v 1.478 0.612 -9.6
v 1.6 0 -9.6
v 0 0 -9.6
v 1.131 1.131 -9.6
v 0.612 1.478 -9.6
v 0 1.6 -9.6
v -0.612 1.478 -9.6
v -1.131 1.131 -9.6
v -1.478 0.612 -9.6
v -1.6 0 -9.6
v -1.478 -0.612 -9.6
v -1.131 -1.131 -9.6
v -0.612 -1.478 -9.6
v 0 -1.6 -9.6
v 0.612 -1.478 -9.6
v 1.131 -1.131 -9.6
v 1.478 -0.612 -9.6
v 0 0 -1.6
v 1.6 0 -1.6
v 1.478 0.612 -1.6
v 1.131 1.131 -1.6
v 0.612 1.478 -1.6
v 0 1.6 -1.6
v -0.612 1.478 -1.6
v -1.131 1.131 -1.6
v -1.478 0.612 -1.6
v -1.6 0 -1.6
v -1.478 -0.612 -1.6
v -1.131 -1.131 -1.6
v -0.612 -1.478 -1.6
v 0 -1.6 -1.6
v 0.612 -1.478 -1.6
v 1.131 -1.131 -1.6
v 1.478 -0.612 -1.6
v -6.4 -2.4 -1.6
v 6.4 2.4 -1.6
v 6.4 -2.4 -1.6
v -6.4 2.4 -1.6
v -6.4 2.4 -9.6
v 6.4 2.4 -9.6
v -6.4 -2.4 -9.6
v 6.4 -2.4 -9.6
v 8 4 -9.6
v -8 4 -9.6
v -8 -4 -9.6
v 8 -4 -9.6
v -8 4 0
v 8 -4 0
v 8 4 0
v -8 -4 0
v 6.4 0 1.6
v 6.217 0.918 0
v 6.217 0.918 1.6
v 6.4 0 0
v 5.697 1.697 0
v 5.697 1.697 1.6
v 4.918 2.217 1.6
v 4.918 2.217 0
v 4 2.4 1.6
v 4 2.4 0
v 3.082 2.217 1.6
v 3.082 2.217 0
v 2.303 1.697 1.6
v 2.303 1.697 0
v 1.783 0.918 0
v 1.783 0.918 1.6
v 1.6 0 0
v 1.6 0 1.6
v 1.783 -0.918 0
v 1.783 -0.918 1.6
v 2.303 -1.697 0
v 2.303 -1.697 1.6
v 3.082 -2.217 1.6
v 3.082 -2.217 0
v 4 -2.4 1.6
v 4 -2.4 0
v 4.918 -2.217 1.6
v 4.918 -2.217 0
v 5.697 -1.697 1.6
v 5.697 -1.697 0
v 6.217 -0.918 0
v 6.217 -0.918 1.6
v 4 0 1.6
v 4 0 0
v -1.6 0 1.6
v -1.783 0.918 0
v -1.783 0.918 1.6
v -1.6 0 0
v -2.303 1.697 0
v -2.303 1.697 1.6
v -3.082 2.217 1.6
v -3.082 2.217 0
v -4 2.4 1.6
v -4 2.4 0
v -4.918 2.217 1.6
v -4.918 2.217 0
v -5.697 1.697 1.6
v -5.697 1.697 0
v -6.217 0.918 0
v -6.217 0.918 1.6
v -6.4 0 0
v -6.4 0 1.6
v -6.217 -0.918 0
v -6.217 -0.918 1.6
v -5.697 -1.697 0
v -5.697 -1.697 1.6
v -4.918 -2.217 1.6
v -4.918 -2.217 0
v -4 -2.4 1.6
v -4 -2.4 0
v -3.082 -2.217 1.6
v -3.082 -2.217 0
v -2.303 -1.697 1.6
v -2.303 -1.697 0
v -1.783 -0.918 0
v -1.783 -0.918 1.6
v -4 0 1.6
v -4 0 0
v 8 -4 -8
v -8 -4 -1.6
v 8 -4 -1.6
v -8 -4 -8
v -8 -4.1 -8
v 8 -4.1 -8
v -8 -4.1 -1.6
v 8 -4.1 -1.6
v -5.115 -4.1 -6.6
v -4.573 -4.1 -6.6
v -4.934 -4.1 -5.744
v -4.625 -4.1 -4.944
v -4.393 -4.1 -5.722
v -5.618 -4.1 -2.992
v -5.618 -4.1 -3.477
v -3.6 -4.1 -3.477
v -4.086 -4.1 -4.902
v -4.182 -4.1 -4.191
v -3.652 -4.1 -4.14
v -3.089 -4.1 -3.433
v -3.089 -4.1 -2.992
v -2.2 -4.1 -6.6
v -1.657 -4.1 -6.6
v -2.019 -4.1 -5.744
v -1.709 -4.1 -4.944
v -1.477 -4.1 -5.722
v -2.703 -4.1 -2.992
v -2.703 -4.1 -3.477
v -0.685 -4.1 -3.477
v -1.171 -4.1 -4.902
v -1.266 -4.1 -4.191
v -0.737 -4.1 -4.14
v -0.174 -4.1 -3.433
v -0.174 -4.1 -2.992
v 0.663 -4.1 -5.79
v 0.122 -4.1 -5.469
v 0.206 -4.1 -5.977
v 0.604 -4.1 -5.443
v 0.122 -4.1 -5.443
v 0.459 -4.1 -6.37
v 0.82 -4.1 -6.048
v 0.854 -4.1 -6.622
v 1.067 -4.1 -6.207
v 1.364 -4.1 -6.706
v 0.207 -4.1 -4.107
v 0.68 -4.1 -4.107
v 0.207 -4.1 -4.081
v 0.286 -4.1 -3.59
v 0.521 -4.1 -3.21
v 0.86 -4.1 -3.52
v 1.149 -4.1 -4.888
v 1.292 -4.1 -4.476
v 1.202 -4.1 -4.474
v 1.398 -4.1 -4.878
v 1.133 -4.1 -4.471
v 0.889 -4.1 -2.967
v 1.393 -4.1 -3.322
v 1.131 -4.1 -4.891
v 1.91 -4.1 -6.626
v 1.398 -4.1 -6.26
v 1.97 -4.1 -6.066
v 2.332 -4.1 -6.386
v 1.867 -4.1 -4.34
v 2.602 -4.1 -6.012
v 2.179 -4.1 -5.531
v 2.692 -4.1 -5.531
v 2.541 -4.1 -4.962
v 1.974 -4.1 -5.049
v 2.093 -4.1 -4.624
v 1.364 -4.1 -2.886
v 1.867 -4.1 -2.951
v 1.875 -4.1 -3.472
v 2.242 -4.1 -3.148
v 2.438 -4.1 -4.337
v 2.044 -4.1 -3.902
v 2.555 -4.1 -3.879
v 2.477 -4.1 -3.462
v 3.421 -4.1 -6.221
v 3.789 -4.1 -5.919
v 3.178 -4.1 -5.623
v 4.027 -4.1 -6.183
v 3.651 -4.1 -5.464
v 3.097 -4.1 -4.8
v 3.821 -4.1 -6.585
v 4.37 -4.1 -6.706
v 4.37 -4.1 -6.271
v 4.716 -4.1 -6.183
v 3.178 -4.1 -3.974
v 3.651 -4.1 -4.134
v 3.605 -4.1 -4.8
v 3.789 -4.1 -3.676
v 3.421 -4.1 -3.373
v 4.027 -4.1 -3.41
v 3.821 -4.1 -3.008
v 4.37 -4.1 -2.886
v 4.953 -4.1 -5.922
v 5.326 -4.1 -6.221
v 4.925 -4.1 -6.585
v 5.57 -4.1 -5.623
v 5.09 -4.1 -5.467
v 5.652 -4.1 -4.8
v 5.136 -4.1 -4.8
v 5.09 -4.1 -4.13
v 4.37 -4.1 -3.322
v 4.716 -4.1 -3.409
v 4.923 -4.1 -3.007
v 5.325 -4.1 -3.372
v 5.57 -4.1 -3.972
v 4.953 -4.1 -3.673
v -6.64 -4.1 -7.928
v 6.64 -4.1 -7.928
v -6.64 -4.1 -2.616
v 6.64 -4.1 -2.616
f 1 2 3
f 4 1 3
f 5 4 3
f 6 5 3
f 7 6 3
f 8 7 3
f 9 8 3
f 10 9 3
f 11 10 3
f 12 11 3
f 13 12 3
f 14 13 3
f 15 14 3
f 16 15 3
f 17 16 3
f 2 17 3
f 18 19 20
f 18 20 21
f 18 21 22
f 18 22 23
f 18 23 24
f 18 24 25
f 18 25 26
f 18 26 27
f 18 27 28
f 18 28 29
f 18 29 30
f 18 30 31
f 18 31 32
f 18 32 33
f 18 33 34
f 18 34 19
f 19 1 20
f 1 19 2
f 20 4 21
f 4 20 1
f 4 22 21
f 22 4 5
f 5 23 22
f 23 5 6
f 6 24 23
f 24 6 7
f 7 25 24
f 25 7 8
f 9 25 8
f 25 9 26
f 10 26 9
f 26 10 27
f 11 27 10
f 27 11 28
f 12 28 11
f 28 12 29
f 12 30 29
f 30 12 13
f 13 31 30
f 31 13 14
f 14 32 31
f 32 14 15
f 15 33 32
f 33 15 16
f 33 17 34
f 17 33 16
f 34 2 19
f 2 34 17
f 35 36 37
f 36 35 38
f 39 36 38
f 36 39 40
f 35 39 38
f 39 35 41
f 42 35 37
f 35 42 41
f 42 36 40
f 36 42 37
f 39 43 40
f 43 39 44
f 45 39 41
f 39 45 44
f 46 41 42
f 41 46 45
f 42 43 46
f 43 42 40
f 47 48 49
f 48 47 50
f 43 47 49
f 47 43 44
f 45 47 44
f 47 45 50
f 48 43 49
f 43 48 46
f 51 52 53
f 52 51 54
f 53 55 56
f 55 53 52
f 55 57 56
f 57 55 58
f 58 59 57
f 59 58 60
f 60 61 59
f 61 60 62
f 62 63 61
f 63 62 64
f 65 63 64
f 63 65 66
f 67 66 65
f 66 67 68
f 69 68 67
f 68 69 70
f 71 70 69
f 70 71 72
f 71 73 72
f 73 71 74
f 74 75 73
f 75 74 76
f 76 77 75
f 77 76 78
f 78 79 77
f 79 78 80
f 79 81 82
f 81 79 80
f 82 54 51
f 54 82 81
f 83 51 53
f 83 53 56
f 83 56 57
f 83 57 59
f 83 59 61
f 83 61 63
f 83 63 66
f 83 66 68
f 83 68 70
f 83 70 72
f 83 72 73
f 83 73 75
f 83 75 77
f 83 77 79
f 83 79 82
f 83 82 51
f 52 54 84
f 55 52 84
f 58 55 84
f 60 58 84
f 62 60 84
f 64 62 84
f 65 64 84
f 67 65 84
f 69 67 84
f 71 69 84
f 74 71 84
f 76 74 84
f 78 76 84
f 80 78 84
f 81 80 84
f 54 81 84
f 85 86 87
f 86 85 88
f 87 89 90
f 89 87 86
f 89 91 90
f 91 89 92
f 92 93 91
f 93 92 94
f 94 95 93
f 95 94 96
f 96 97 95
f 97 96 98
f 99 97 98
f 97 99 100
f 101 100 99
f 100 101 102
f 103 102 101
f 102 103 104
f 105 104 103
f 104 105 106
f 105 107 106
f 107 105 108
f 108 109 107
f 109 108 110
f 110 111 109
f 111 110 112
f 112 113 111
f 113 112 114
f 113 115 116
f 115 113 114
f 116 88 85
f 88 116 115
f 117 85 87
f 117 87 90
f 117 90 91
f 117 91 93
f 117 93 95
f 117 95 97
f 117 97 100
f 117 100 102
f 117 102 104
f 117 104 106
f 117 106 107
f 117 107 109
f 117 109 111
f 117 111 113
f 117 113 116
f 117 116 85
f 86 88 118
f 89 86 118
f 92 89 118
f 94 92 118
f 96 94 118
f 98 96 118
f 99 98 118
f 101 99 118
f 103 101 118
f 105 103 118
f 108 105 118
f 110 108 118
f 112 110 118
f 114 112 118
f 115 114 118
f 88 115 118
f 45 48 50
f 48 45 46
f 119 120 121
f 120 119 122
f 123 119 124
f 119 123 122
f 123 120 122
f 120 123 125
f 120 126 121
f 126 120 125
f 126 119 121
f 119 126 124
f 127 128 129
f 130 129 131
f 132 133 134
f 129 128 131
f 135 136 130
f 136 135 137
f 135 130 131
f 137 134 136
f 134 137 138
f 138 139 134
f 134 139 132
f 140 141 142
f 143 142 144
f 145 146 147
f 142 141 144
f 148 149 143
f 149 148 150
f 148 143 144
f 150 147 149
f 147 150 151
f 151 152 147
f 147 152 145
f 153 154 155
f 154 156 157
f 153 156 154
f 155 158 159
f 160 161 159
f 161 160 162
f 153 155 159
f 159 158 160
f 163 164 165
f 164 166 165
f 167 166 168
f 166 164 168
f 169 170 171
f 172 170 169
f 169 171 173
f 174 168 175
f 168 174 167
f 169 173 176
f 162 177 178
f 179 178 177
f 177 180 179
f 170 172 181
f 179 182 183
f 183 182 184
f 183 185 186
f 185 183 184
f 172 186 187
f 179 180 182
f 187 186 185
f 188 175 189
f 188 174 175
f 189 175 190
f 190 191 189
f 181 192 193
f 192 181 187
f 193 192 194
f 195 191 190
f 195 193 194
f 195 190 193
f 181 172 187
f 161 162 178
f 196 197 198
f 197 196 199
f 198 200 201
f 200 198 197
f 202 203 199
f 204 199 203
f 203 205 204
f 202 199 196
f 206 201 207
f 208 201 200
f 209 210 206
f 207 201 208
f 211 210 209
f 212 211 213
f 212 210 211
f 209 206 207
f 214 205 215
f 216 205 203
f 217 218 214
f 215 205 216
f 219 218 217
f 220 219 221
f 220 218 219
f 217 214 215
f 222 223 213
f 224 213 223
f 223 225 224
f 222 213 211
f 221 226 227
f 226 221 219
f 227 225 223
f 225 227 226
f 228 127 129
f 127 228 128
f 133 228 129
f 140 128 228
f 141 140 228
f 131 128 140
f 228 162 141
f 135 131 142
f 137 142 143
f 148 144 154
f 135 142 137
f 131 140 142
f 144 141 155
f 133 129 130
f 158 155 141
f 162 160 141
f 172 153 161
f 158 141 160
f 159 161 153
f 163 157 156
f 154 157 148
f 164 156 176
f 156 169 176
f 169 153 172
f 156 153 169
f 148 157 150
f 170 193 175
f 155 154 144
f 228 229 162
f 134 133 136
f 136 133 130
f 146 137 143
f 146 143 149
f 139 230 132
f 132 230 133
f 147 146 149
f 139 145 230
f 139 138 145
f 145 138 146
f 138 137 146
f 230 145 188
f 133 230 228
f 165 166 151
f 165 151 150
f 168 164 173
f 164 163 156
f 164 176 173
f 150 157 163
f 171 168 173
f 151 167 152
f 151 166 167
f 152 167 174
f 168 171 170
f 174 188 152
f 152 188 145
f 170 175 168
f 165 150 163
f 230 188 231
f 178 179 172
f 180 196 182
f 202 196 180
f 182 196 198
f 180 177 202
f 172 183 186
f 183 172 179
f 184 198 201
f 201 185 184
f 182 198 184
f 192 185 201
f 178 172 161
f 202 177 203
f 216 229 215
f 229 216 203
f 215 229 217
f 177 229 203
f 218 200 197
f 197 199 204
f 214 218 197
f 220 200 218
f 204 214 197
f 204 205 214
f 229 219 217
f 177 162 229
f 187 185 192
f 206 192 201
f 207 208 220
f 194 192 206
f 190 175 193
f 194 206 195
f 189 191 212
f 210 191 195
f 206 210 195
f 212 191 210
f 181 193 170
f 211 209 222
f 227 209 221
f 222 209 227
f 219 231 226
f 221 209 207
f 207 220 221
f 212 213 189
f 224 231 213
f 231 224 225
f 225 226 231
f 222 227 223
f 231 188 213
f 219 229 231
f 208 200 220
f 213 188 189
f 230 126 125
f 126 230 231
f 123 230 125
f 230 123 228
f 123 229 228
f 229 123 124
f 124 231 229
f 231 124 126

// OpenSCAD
// file: ../p/4-4edge.scad
use <../lib.scad>
function ldraw_lib__4_4edge() = [
// 0 Circle 1.0
// 0 Name: 4-4edge.dat
// 0 Author: James Jessiman
// 0 !LDRAW_ORG Primitive UPDATE 2017-01
// 0 !LICENSE Licensed under CC BY 2.0 and CC BY 4.0 : see CAreadme.txt
// 
// 0 BFC CERTIFY CCW
  [0,"BFC","CERTIFY"],
  [0,"BFC","CCW"],
// 
// 0 !HISTORY 1998-12-15 [PTadmin] Official Update 1998-10
// 0 !HISTORY 2005-12-28 [PTadmin] Official Update 2005-01
// 0 !HISTORY 2007-06-24 [PTadmin] Header formatted for Contributor Agreement
// 0 !HISTORY 2008-07-01 [PTadmin] Official Update 2008-01
// 0 !HISTORY 2017-01-15 [Steffen] BFCed
// 0 !HISTORY 2017-12-30 [PTadmin] Official Update 2017-01
// 
// 
// 2 24 1 0 0 0.9239 0 0.3827
  [2,24,1,0,0,0.9239,0,0.3827],
// 2 24 0.9239 0 0.3827 0.7071 0 0.7071
  [2,24,0.9239,0,0.3827,0.7071,0,0.7071],
// 2 24 0.7071 0 0.7071 0.3827 0 0.9239
  [2,24,0.7071,0,0.7071,0.3827,0,0.9239],
// 2 24 0.3827 0 0.9239 0 0 1
  [2,24,0.3827,0,0.9239,0,0,1],
// 2 24 0 0 1 -0.3827 0 0.9239
  [2,24,0,0,1,-0.3827,0,0.9239],
// 2 24 -0.3827 0 0.9239 -0.7071 0 0.7071
  [2,24,-0.3827,0,0.9239,-0.7071,0,0.7071],
// 2 24 -0.7071 0 0.7071 -0.9239 0 0.3827
  [2,24,-0.7071,0,0.7071,-0.9239,0,0.3827],
// 2 24 -0.9239 0 0.3827 -1 0 -0
  [2,24,-0.9239,0,0.3827,-1,0,-0],
// 2 24 -1 0 -0 -0.9239 0 -0.3827
  [2,24,-1,0,-0,-0.9239,0,-0.3827],
// 2 24 -0.9239 0 -0.3827 -0.7071 0 -0.7071
  [2,24,-0.9239,0,-0.3827,-0.7071,0,-0.7071],
// 2 24 -0.7071 0 -0.7071 -0.3827 0 -0.9239
  [2,24,-0.7071,0,-0.7071,-0.3827,0,-0.9239],
// 2 24 -0.3827 0 -0.9239 0 0 -1
  [2,24,-0.3827,0,-0.9239,0,0,-1],
// 2 24 0 0 -1 0.3827 0 -0.9239
  [2,24,0,0,-1,0.3827,0,-0.9239],
// 2 24 0.3827 0 -0.9239 0.7071 0 -0.7071
  [2,24,0.3827,0,-0.9239,0.7071,0,-0.7071],
// 2 24 0.7071 0 -0.7071 0.9239 0 -0.3827
  [2,24,0.7071,0,-0.7071,0.9239,0,-0.3827],
// 2 24 0.9239 0 -0.3827 1 0 0
  [2,24,0.9239,0,-0.3827,1,0,0],
];
module ldraw_lib__4_4edge(step=0, col=false, unit=2/5, alt=false, line=0.2, solid=!$preview)
    makepoly(ldraw_lib__4_4edge(), step=step, col=col, unit=unit, alt=alt, line=line, solid=solid);
ldraw_lib__4_4edge(line=0.2);
// file: ../p/4-4disc.scad
use <../lib.scad>
function ldraw_lib__4_4disc() = [
// 0 Disc 1.0
// 0 Name: 4-4disc.dat
// 0 Author: James Jessiman
// 0 !LDRAW_ORG Primitive UPDATE 2002-02
// 0 !LICENSE Licensed under CC BY 2.0 and CC BY 4.0 : see CAreadme.txt
// 
// 0 BFC CERTIFY CCW
  [0,"BFC","CERTIFY"],
  [0,"BFC","CCW"],
// 
// 0 !HISTORY 1998-12-15 [PTadmin] Official Update 1998-10
// 0 !HISTORY 2002-03-23 [sbliss] Added BFC statement
// 0 !HISTORY 2002-04-25 [PTadmin] Official Update 2002-02
// 0 !HISTORY 2007-06-24 [PTadmin] Header formatted for Contributor Agreement
// 0 !HISTORY 2008-07-01 [PTadmin] Official Update 2008-01
// 
// 
// 3 16 0 0 0 1 0 0 0.9239 0 0.3827
  [3,16,0,0,0,1,0,0,0.9239,0,0.3827],
// 3 16 0 0 0 0.9239 0 0.3827 0.7071 0 0.7071
  [3,16,0,0,0,0.9239,0,0.3827,0.7071,0,0.7071],
// 3 16 0 0 0 0.7071 0 0.7071 0.3827 0 0.9239
  [3,16,0,0,0,0.7071,0,0.7071,0.3827,0,0.9239],
// 3 16 0 0 0 0.3827 0 0.9239 0 0 1
  [3,16,0,0,0,0.3827,0,0.9239,0,0,1],
// 3 16 0 0 0 0 0 1 -0.3827 0 0.9239
  [3,16,0,0,0,0,0,1,-0.3827,0,0.9239],
// 3 16 0 0 0 -0.3827 0 0.9239 -0.7071 0 0.7071
  [3,16,0,0,0,-0.3827,0,0.9239,-0.7071,0,0.7071],
// 3 16 0 0 0 -0.7071 0 0.7071 -0.9239 0 0.3827
  [3,16,0,0,0,-0.7071,0,0.7071,-0.9239,0,0.3827],
// 3 16 0 0 0 -0.9239 0 0.3827 -1 0 -0
  [3,16,0,0,0,-0.9239,0,0.3827,-1,0,-0],
// 3 16 0 0 0 -1 0 -0 -0.9239 0 -0.3827
  [3,16,0,0,0,-1,0,-0,-0.9239,0,-0.3827],
// 3 16 0 0 0 -0.9239 0 -0.3827 -0.7071 0 -0.7071
  [3,16,0,0,0,-0.9239,0,-0.3827,-0.7071,0,-0.7071],
// 3 16 0 0 0 -0.7071 0 -0.7071 -0.3827 0 -0.9239
  [3,16,0,0,0,-0.7071,0,-0.7071,-0.3827,0,-0.9239],
// 3 16 0 0 0 -0.3827 0 -0.9239 0 0 -1
  [3,16,0,0,0,-0.3827,0,-0.9239,0,0,-1],
// 3 16 0 0 0 0 0 -1 0.3827 0 -0.9239
  [3,16,0,0,0,0,0,-1,0.3827,0,-0.9239],
// 3 16 0 0 0 0.3827 0 -0.9239 0.7071 0 -0.7071
  [3,16,0,0,0,0.3827,0,-0.9239,0.7071,0,-0.7071],
// 3 16 0 0 0 0.7071 0 -0.7071 0.9239 0 -0.3827
  [3,16,0,0,0,0.7071,0,-0.7071,0.9239,0,-0.3827],
// 3 16 0 0 0 0.9239 0 -0.3827 1 0 0
  [3,16,0,0,0,0.9239,0,-0.3827,1,0,0],
// 0
];
module ldraw_lib__4_4disc(step=0, col=false, unit=2/5, alt=false, line=0.2, solid=!$preview)
    makepoly(ldraw_lib__4_4disc(), step=step, col=col, unit=unit, alt=alt, line=line, solid=solid);
ldraw_lib__4_4disc(line=0.2);
// file: ../p/4-4cyli.scad
use <../lib.scad>
$fa=1; $fs=0.2;
function ldraw_lib__4_4cyli(realsolid=false) = [
// 0 Cylinder 1.0
// 0 Name: 4-4cyli.dat
// 0 Author: James Jessiman
// 0 !LDRAW_ORG Primitive UPDATE 2005-01
// 0 !LICENSE Licensed under CC BY 2.0 and CC BY 4.0 : see CAreadme.txt
// 
// 0 BFC CERTIFY CCW
  [0,"BFC","CERTIFY"],
  [0,"BFC","CCW"],
// 
// 0 !HISTORY 1998-12-15 [PTadmin] Official Update 1998-10
// 0 !HISTORY 2002-03-23 [sbliss] Added BFC statement; merged headers from files in distributions LDraw 0.27 and Complete.
// 0 !HISTORY 2002-04-25 [PTadmin] Official Update 2002-02
// 0 !HISTORY 2004-12-14 [guyvivan] BFC CCW
// 0 !HISTORY 2005-12-28 [PTadmin] Official Update 2005-01
// 0 !HISTORY 2007-06-24 [PTadmin] Header formatted for Contributor Agreement
// 0 !HISTORY 2008-07-01 [PTadmin] Official Update 2008-01
// 
// 
// 4 16 1 1 0 0.9239 1 0.3827 0.9239 0 0.3827 1 0 0
  [4,16,1,1,0,0.9239,1,0.3827,0.9239,0,0.3827,1,0,0],
// 5 24 1 0 0 1 1 0 0.9239 0 0.3827 0.9239 0 -0.3827
  [5,24,1,0,0,1,1,0,0.9239,0,0.3827,0.9239,0,-0.3827],
// 4 16 0.9239 1 0.3827 0.7071 1 0.7071 0.7071 0 0.7071 0.9239 0 0.3827
  [4,16,0.9239,1,0.3827,0.7071,1,0.7071,0.7071,0,0.7071,0.9239,0,0.3827],
// 5 24 0.9239 0 0.3827 0.9239 1 0.3827 0.7071 0 0.7071 1 0 0
  [5,24,0.9239,0,0.3827,0.9239,1,0.3827,0.7071,0,0.7071,1,0,0],
// 4 16 0.7071 1 0.7071 0.3827 1 0.9239 0.3827 0 0.9239 0.7071 0 0.7071
  [4,16,0.7071,1,0.7071,0.3827,1,0.9239,0.3827,0,0.9239,0.7071,0,0.7071],
// 5 24 0.7071 0 0.7071 0.7071 1 0.7071 0.3827 0 0.9239 0.9239 0 0.3827
  [5,24,0.7071,0,0.7071,0.7071,1,0.7071,0.3827,0,0.9239,0.9239,0,0.3827],
// 4 16 0.3827 1 0.9239 0 1 1 0 0 1 0.3827 0 0.9239
  [4,16,0.3827,1,0.9239,0,1,1,0,0,1,0.3827,0,0.9239],
// 5 24 0.3827 0 0.9239 0.3827 1 0.9239 0 0 1 0.7071 0 0.7071
  [5,24,0.3827,0,0.9239,0.3827,1,0.9239,0,0,1,0.7071,0,0.7071],
// 4 16 0 1 1 -0.3827 1 0.9239 -0.3827 0 0.9239 0 0 1
  [4,16,0,1,1,-0.3827,1,0.9239,-0.3827,0,0.9239,0,0,1],
// 5 24 0 0 1 0 1 1 -0.3827 0 0.9239 0.3827 0 0.9239
  [5,24,0,0,1,0,1,1,-0.3827,0,0.9239,0.3827,0,0.9239],
// 4 16 -0.3827 1 0.9239 -0.7071 1 0.7071 -0.7071 0 0.7071 -0.3827 0 0.9239
  [4,16,-0.3827,1,0.9239,-0.7071,1,0.7071,-0.7071,0,0.7071,-0.3827,0,0.9239],
// 5 24 -0.3827 0 0.9239 -0.3827 1 0.9239 -0.7071 0 0.7071 0 0 1
  [5,24,-0.3827,0,0.9239,-0.3827,1,0.9239,-0.7071,0,0.7071,0,0,1],
// 4 16 -0.7071 1 0.7071 -0.9239 1 0.3827 -0.9239 0 0.3827 -0.7071 0 0.7071
  [4,16,-0.7071,1,0.7071,-0.9239,1,0.3827,-0.9239,0,0.3827,-0.7071,0,0.7071],
// 5 24 -0.7071 0 0.7071 -0.7071 1 0.7071 -0.9239 0 0.3827 -0.3827 0 0.9239
  [5,24,-0.7071,0,0.7071,-0.7071,1,0.7071,-0.9239,0,0.3827,-0.3827,0,0.9239],
// 4 16 -0.9239 1 0.3827 -1 1 0 -1 0 0 -0.9239 0 0.3827
  [4,16,-0.9239,1,0.3827,-1,1,0,-1,0,0,-0.9239,0,0.3827],
// 5 24 -0.9239 0 0.3827 -0.9239 1 0.3827 -1 0 0 -0.7071 0 0.7071
  [5,24,-0.9239,0,0.3827,-0.9239,1,0.3827,-1,0,0,-0.7071,0,0.7071],
// 4 16 -1 1 0 -0.9239 1 -0.3827 -0.9239 0 -0.3827 -1 0 0
  [4,16,-1,1,0,-0.9239,1,-0.3827,-0.9239,0,-0.3827,-1,0,0],
// 5 24 -1 0 0 -1 1 0 -0.9239 0 -0.3827 -0.9239 0 0.3827
  [5,24,-1,0,0,-1,1,0,-0.9239,0,-0.3827,-0.9239,0,0.3827],
// 4 16 -0.9239 1 -0.3827 -0.7071 1 -0.7071 -0.7071 0 -0.7071 -0.9239 0 -0.3827
  [4,16,-0.9239,1,-0.3827,-0.7071,1,-0.7071,-0.7071,0,-0.7071,-0.9239,0,-0.3827],
// 5 24 -0.9239 0 -0.3827 -0.9239 1 -0.3827 -0.7071 0 -0.7071 -1 0 0
  [5,24,-0.9239,0,-0.3827,-0.9239,1,-0.3827,-0.7071,0,-0.7071,-1,0,0],
// 4 16 -0.7071 1 -0.7071 -0.3827 1 -0.9239 -0.3827 0 -0.9239 -0.7071 0 -0.7071
  [4,16,-0.7071,1,-0.7071,-0.3827,1,-0.9239,-0.3827,0,-0.9239,-0.7071,0,-0.7071],
// 5 24 -0.7071 0 -0.7071 -0.7071 1 -0.7071 -0.3827 0 -0.9239 -0.9239 0 -0.3827
  [5,24,-0.7071,0,-0.7071,-0.7071,1,-0.7071,-0.3827,0,-0.9239,-0.9239,0,-0.3827],
// 4 16 -0.3827 1 -0.9239 0 1 -1 0 0 -1 -0.3827 0 -0.9239
  [4,16,-0.3827,1,-0.9239,0,1,-1,0,0,-1,-0.3827,0,-0.9239],
// 5 24 -0.3827 0 -0.9239 -0.3827 1 -0.9239 0 0 -1 -0.7071 0 -0.7071
  [5,24,-0.3827,0,-0.9239,-0.3827,1,-0.9239,0,0,-1,-0.7071,0,-0.7071],
// 4 16 0 1 -1 0.3827 1 -0.9239 0.3827 0 -0.9239 0 0 -1
  [4,16,0,1,-1,0.3827,1,-0.9239,0.3827,0,-0.9239,0,0,-1],
// 5 24 0 0 -1 0 1 -1 0.3827 0 -0.9239 -0.3827 0 -0.9239
  [5,24,0,0,-1,0,1,-1,0.3827,0,-0.9239,-0.3827,0,-0.9239],
// 4 16 0.3827 1 -0.9239 0.7071 1 -0.7071 0.7071 0 -0.7071 0.3827 0 -0.9239
  [4,16,0.3827,1,-0.9239,0.7071,1,-0.7071,0.7071,0,-0.7071,0.3827,0,-0.9239],
// 5 24 0.3827 0 -0.9239 0.3827 1 -0.9239 0.7071 0 -0.7071 0 0 -1
  [5,24,0.3827,0,-0.9239,0.3827,1,-0.9239,0.7071,0,-0.7071,0,0,-1],
// 4 16 0.7071 1 -0.7071 0.9239 1 -0.3827 0.9239 0 -0.3827 0.7071 0 -0.7071
  [4,16,0.7071,1,-0.7071,0.9239,1,-0.3827,0.9239,0,-0.3827,0.7071,0,-0.7071],
// 5 24 0.7071 0 -0.7071 0.7071 1 -0.7071 0.9239 0 -0.3827 0.3827 0 -0.9239
  [5,24,0.7071,0,-0.7071,0.7071,1,-0.7071,0.9239,0,-0.3827,0.3827,0,-0.9239],
// 4 16 0.9239 1 -0.3827 1 1 0 1 0 0 0.9239 0 -0.3827
  [4,16,0.9239,1,-0.3827,1,1,0,1,0,0,0.9239,0,-0.3827],
// 5 24 0.9239 0 -0.3827 0.9239 1 -0.3827 1 0 0 0.7071 0 -0.7071
  [5,24,0.9239,0,-0.3827,0.9239,1,-0.3827,1,0,0,0.7071,0,-0.7071],
// 0
];
module ldraw_lib__4_4cyli(step=0, col=false, unit=2/5, alt=false, line=0.2, solid=!$preview)
    makepoly(ldraw_lib__4_4cyli(solid), step=step, col=col, unit=unit, alt=alt, line=line, solid=solid);
ldraw_lib__4_4cyli(line=0.2);
// file: ../p/stud3.scad
use <../lib.scad>
use <4-4cyli.scad>
use <4-4disc.scad>
use <4-4edge.scad>
function ldraw_lib__stud3() = [
// 0 Stud Tube Solid
// 0 Name: stud3.dat
// 0 Author: James Jessiman
// 0 !LDRAW_ORG Primitive UPDATE 2012-01
// 0 !LICENSE Licensed under CC BY 4.0 : see CAreadme.txt
// 
// 0 BFC CERTIFY CCW
  [0,"BFC","CERTIFY"],
  [0,"BFC","CCW"],
// 
// 0 !HISTORY 2002-04-04 [sbliss] Modified for BFC compliance
// 0 !HISTORY 2002-04-25 [PTadmin] Official Update 2002-02
// 0 !HISTORY 2007-06-24 [PTadmin] Header formatted for Contributor Agreement
// 0 !HISTORY 2008-07-01 [PTadmin] Official Update 2008-01
// 0 !HISTORY 2012-02-16 [Philo] Changed to CCW
// 0 !HISTORY 2012-03-30 [PTadmin] Official Update 2012-01
// 
// 
// 1 16 0 -4 0 4 0 0 0 1 0 0 0 4 4-4edge.dat
  [1,16,0,-4,0,4,0,0,0,1,0,0,0,4, ldraw_lib__4_4edge()],
// 1 16 0 0 0 4 0 0 0 1 0 0 0 4 4-4edge.dat
  [1,16,0,0,0,4,0,0,0,1,0,0,0,4, ldraw_lib__4_4edge()],
// 1 16 0 -4 0 4 0 0 0 1 0 0 0 4 4-4disc.dat
  [1,16,0,-4,0,4,0,0,0,1,0,0,0,4, ldraw_lib__4_4disc()],
  [-1,16,0,0,0,4,0,0,0,-1,0,0,0,4, ldraw_lib__4_4disc()],
// 1 16 0 -4 0 4 0 0 0 4 0 0 0 4 4-4cyli.dat
  [1,16,0,-4,0,4,0,0,0,4,0,0,0,4, ldraw_lib__4_4cyli()],
];
module ldraw_lib__stud3(step=0, col=false, unit=2/5, alt=false, line=0.2, solid=!$preview)
    makepoly(ldraw_lib__stud3(), step=step, col=col, unit=unit, alt=alt, line=line, solid=solid);
ldraw_lib__stud3(line=0.2);
// file: ../p/stud.scad
use <../lib.scad>
use <4-4cyli.scad>
use <4-4disc.scad>
use <4-4edge.scad>
function ldraw_lib__stud() = [
// 0 Stud
// 0 Name: stud.dat
// 0 Author: James Jessiman
// 0 !LDRAW_ORG Primitive UPDATE 2012-01
// 0 !LICENSE Licensed under CC BY 4.0 : see CAreadme.txt
// 
// 0 BFC CERTIFY CCW
  [0,"BFC","CERTIFY"],
  [0,"BFC","CCW"],
// 
// 0 !HISTORY 2002-04-04 [sbliss] Modified for BFC compliance
// 0 !HISTORY 2002-04-25 [PTadmin] Official Update 2002-02
// 0 !HISTORY 2007-06-24 [PTadmin] Header formatted for Contributor Agreement
// 0 !HISTORY 2008-07-01 [PTadmin] Official Update 2008-01
// 0 !HISTORY 2012-02-16 [Philo] Changed to CCW
// 0 !HISTORY 2012-03-30 [PTadmin] Official Update 2012-01
// 
// 
// 1 16 0 0 0 6 0 0 0 1 0 0 0 6 4-4edge.dat
  [1,16,0,0,0,6,0,0,0,1,0,0,0,6, ldraw_lib__4_4edge()],
// 1 16 0 -4 0 6 0 0 0 1 0 0 0 6 4-4edge.dat
  [1,16,0,-4,0,6,0,0,0,1,0,0,0,6, ldraw_lib__4_4edge()],
// 1 16 0 0 0 6 0 0 0 -4 0 0 0 6 4-4cyli.dat
  [1,16,0,0,0,6,0,0,0,-4,0,0,0,6, ldraw_lib__4_4cyli()],
// 1 16 0 -4 0 6 0 0 0 1 0 0 0 6 4-4disc.dat
  [1,16,0,-4,0,6,0,0,0,1,0,0,0,6, ldraw_lib__4_4disc()],
  [-1,16,0,0,0,6,0,0,0,-1,0,0,0,6, ldraw_lib__4_4disc()],
];
module ldraw_lib__stud(step=0, col=false, unit=2/5, alt=false, line=0.2, solid=!$preview)
    makepoly(ldraw_lib__stud(), step=step, col=col, unit=unit, alt=alt, line=line, solid=solid);
ldraw_lib__stud(line=0.2);
// file: ../p/box5.scad
use <../lib.scad>
function ldraw_lib__box5() = [
// 0 Box with 5 Faces and All Edges
// 0 Name: box5.dat
// 0 Author: James Jessiman
// 0 !LDRAW_ORG Primitive UPDATE 2012-01
// 0 !LICENSE Licensed under CC BY 2.0 and CC BY 4.0 : see CAreadme.txt
// 
// 0 BFC CERTIFY CCW
  [0,"BFC","CERTIFY"],
  [0,"BFC","CCW"],
// 
// 0 !HISTORY 2002-04-03 [sbliss] Modified for BFC compliance
// 0 !HISTORY 2002-04-25 [PTadmin] Official Update 2002-02
// 0 !HISTORY 2007-06-24 [PTadmin] Header formatted for Contributor Agreement
// 0 !HISTORY 2008-07-01 [PTadmin] Official Update 2008-01
// 0 !HISTORY 2012-02-16 [Philo] Changed to CCW
// 0 !HISTORY 2012-03-30 [PTadmin] Official Update 2012-01
// 
// 
// 2 24 1 1 1 -1 1 1
  [2,24,1,1,1,-1,1,1],
// 2 24 -1 1 1 -1 1 -1
  [2,24,-1,1,1,-1,1,-1],
// 2 24 -1 1 -1 1 1 -1
  [2,24,-1,1,-1,1,1,-1],
// 2 24 1 1 -1 1 1 1
  [2,24,1,1,-1,1,1,1],
// 2 24 1 0 1 -1 0 1
  [2,24,1,0,1,-1,0,1],
// 2 24 -1 0 1 -1 0 -1
  [2,24,-1,0,1,-1,0,-1],
// 2 24 -1 0 -1 1 0 -1
  [2,24,-1,0,-1,1,0,-1],
// 2 24 1 0 -1 1 0 1
  [2,24,1,0,-1,1,0,1],
// 2 24 1 0 1 1 1 1
  [2,24,1,0,1,1,1,1],
// 2 24 -1 0 1 -1 1 1
  [2,24,-1,0,1,-1,1,1],
// 2 24 1 0 -1 1 1 -1
  [2,24,1,0,-1,1,1,-1],
// 2 24 -1 0 -1 -1 1 -1
  [2,24,-1,0,-1,-1,1,-1],
// 4 16 -1 1 1 1 1 1 1 1 -1 -1 1 -1
  [4,16,-1,1,1,1,1,1,1,1,-1,-1,1,-1],
// 4 16 -1 1 1 -1 0 1 1 0 1 1 1 1
  [4,16,-1,1,1,-1,0,1,1,0,1,1,1,1],
// 4 16 -1 1 -1 -1 0 -1 -1 0 1 -1 1 1
  [4,16,-1,1,-1,-1,0,-1,-1,0,1,-1,1,1],
// 4 16 1 1 -1 1 0 -1 -1 0 -1 -1 1 -1
  [4,16,1,1,-1,1,0,-1,-1,0,-1,-1,1,-1],
// 4 16 1 1 1 1 0 1 1 0 -1 1 1 -1
  [4,16,1,1,1,1,0,1,1,0,-1,1,1,-1],
];
makepoly(ldraw_lib__box5(), line=0.2);
// file: ../p/box4t.scad
use <../lib.scad>
function ldraw_lib__box4t() = [
// 0 Box with 4 Adjacent Faces and All Edges
// 0 Name: box4t.dat
// 0 Author: Tore Eriksson [Tore_Eriksson]
// 0 !LDRAW_ORG Primitive UPDATE 2003-02
// 0 !LICENSE Licensed under CC BY 2.0 and CC BY 4.0 : see CAreadme.txt
// 
// 0 BFC CERTIFY CCW
  [0,"BFC","CERTIFY"],
  [0,"BFC","CCW"],
// 
// 0 !HISTORY 1997-09-29 [PTadmin] Official Update 1997-15
// 0 !HISTORY 2002-08-31 [izanette] Modified with WINDZ for BFC compliance
// 0 !HISTORY 2003-08-01 [PTadmin] Official Update 2003-02
// 0 !HISTORY 2007-06-24 [PTadmin] Header formatted for Contributor Agreement
// 0 !HISTORY 2008-07-01 [PTadmin] Official Update 2008-01
// 
// 
// 2 24 1 1 1 -1 1 1
  [2,24,1,1,1,-1,1,1],
// 2 24 -1 1 1 -1 1 -1
  [2,24,-1,1,1,-1,1,-1],
// 2 24 -1 1 -1 1 1 -1
  [2,24,-1,1,-1,1,1,-1],
// 2 24 1 1 -1 1 1 1
  [2,24,1,1,-1,1,1,1],
// 2 24 1 0 1 -1 0 1
  [2,24,1,0,1,-1,0,1],
// 2 24 -1 0 1 -1 0 -1
  [2,24,-1,0,1,-1,0,-1],
// 2 24 -1 0 -1 1 0 -1
  [2,24,-1,0,-1,1,0,-1],
// 2 24 1 0 -1 1 0 1
  [2,24,1,0,-1,1,0,1],
// 2 24 1 0 1 1 1 1
  [2,24,1,0,1,1,1,1],
// 2 24 -1 0 1 -1 1 1
  [2,24,-1,0,1,-1,1,1],
// 2 24 1 0 -1 1 1 -1
  [2,24,1,0,-1,1,1,-1],
// 2 24 -1 0 -1 -1 1 -1
  [2,24,-1,0,-1,-1,1,-1],
// 4 16 1 1 1 1 1 -1 -1 1 -1 -1 1 1
  [4,16,1,1,1,1,1,-1,-1,1,-1,-1,1,1],
// 4 16 1 1 1 -1 1 1 -1 0 1 1 0 1
  [4,16,1,1,1,-1,1,1,-1,0,1,1,0,1],
// 4 16 -1 1 1 -1 1 -1 -1 0 -1 -1 0 1
  [4,16,-1,1,1,-1,1,-1,-1,0,-1,-1,0,1],
// 0 4 16 -1 1 -1 -1 0 -1 1 0 -1 1 1 -1
// 4 16 1 1 -1 1 1 1 1 0 1 1 0 -1
  [4,16,1,1,-1,1,1,1,1,0,1,1,0,-1],
// 0
];
makepoly(ldraw_lib__box4t(), line=0.2);
// file: s/3004s01.scad
use <../../lib.scad>
use <../../p/box4t.scad>
use <../../p/box5.scad>
use <../../p/stud.scad>
use <../../p/stud3.scad>
$fa=1; $fs=0.2;
function ldraw_lib__s__3004s01(realsolid=false) = [
// 0 ~Brick  1 x  2 without Front Face
// 0 Name: s\3004s01.dat
// 0 Author: James Jessiman
// 0 !LDRAW_ORG Subpart UPDATE 2003-03
// 0 !LICENSE Licensed under CC BY 2.0 and CC BY 4.0 : see CAreadme.txt
// 
// 0 BFC CERTIFY CCW
  [0,"BFC","CERTIFY"],
  [0,"BFC","CCW"],
// 
// 0 !HISTORY 2003-09-07 [jriley] Subfiling, BFC
// 0 !HISTORY 2003-12-19 [PTadmin] Official Update 2003-03
// 0 !HISTORY 2007-08-29 [PTadmin] Header formatted for Contributor Agreement
// 0 !HISTORY 2008-07-01 [PTadmin] Official Update 2008-01
// 
// 
// 1 16 0 4 0 1 0 0 0 -5 0 0 0 1 stud3.dat
  [1,16,0,4,0,1,0,0,0,-5,0,0,0,1, ldraw_lib__stud3(realsolid)],
// 0 BFC INVERTNEXT
  [0,"BFC","INVERTNEXT"],
// 1 16 0 24 0 16 0 0 0 -20 0 0 0 6 box5.dat
  [1,16,0,24,0,16,0,0,0,-20,0,0,0,6, ldraw_lib__box5(realsolid)],
// 4 16 20 24 10 16 24 6 -16 24 6 -20 24 10
  [4,16,20,24,10,16,24,6,-16,24,6,-20,24,10],
// 4 16 -20 24 10 -16 24 6 -16 24 -6 -20 24 -10
  [4,16,-20,24,10,-16,24,6,-16,24,-6,-20,24,-10],
// 4 16 -20 24 -10 -16 24 -6 16 24 -6 20 24 -10
  [4,16,-20,24,-10,-16,24,-6,16,24,-6,20,24,-10],
// 4 16 20 24 -10 16 24 -6 16 24 6 20 24 10
  [4,16,20,24,-10,16,24,-6,16,24,6,20,24,10],
// 1 16 0 24 0 20 0 0 0 -24 0 0 0 10 box4t.dat
  [1,16,0,24,0,20,0,0,0,-24,0,0,0,10, ldraw_lib__box4t(realsolid)],
// 1 16 10 0 0 1 0 0 0 1 0 0 0 1 stud.dat
  [1,16,10,0,0,1,0,0,0,1,0,0,0,1, ldraw_lib__stud(realsolid)],
// 1 16 -10 0 0 1 0 0 0 1 0 0 0 1 stud.dat
  [1,16,-10,0,0,1,0,0,0,1,0,0,0,1, ldraw_lib__stud(realsolid)],
// 0
];
module ldraw_lib__s__3004s01(step=0, col=false, unit=2/5, alt=false, line=0.2, solid=!$preview)
    makepoly(ldraw_lib__s__3004s01(solid), step=step, col=col, unit=unit, alt=alt, line=line, solid=solid);
ldraw_lib__s__3004s01(line=0.2);
// file: ../p/box5-12.scad
use <../lib.scad>
function ldraw_lib__box5_12() = [
// 0 Box with 5 Faces without Any Edges
// 0 Name: box5-12.dat
// 0 Author: Chris Dee [cwdee]
// 0 !LDRAW_ORG Primitive UPDATE 2009-02
// 0 !LICENSE Licensed under CC BY 2.0 and CC BY 4.0 : see CAreadme.txt
// 
// 0 BFC CERTIFY CCW
  [0,"BFC","CERTIFY"],
  [0,"BFC","CCW"],
// 
// 0 !HISTORY 2009-09-03 [PTadmin] Official Update 2009-02
// 
// 
// 4 16 1 1 1 1 1 -1 -1 1 -1 -1 1 1
  [4,16,1,1,1,1,1,-1,-1,1,-1,-1,1,1],
// 4 16 -1 0 1 1 0 1 1 1 1 -1 1 1
  [4,16,-1,0,1,1,0,1,1,1,1,-1,1,1],
// 4 16 -1 0 -1 -1 0 1 -1 1 1 -1 1 -1
  [4,16,-1,0,-1,-1,0,1,-1,1,1,-1,1,-1],
// 4 16 1 0 -1 -1 0 -1 -1 1 -1 1 1 -1
  [4,16,1,0,-1,-1,0,-1,-1,1,-1,1,1,-1],
// 4 16 1 0 1 1 0 -1 1 1 -1 1 1 1
  [4,16,1,0,1,1,0,-1,1,1,-1,1,1,1],
// 0
];
module ldraw_lib__box5_12(step=0, col=false, unit=2/5, alt=false, line=0.2, solid=!$preview)
    makepoly(ldraw_lib__box5_12(), step=step, col=col, unit=unit, alt=alt, line=line, solid=solid);
ldraw_lib__box5_12(line=0.2);
// file: 3004.scad
use <../lib.scad>
use <s/3004s01.scad>
function ldraw_lib__3004() = [
// 0 Brick  1 x  2
// 0 Name: 3004.dat
// 0 Author: James Jessiman
// 0 !LDRAW_ORG Part UPDATE 2022-05
// 0 !LICENSE Licensed under CC BY 2.0 and CC BY 4.0 : see CAreadme.txt
// 
// 0 BFC CERTIFY CCW
  [0,"BFC","CERTIFY"],
  [0,"BFC","CCW"],
// 
// 0 !HISTORY 2001-10-26 [PTadmin] Official Update 2001-01
// 0 !HISTORY 2002-05-07 {unknown} BFC Certification
// 0 !HISTORY 2002-06-11 [PTadmin] Official Update 2002-03
// 0 !HISTORY 2007-05-07 [PTadmin] Header formatted for Contributor Agreement
// 0 !HISTORY 2008-07-01 [PTadmin] Official Update 2008-01
// 0 !HISTORY 2022-08-04 [MagFors] Using subfile
// 0 !HISTORY 2022-09-15 [PTadmin] Official Update 2022-05
// 
// 
// 1 16 0 0 0 1 0 0 0 1 0 0 0 1 s\3004s01.dat
  [1,16,0,0,0,1,0,0,0,1,0,0,0,1, ldraw_lib__s__3004s01()],
// 4 16 -20 24 -10 20 24 -10 20 0 -10 -20 0 -10
  [4,16,-20,24,-10,20,24,-10,20,0,-10,-20,0,-10],
];
module ldraw_lib__3004(step=0, col=false, unit=2/5, alt=false, line=0.2, solid=!$preview)
    makepoly(ldraw_lib__3004(), step=step, col=col, unit=unit, alt=alt, line=line, solid=solid);
ldraw_lib__3004(line=0.2);
// file: 191905b.scad
use <../lib.scad>
use <../p/box5-12.scad>
use <s/191905s01.scad>
$fa=1; $fs=0.2;
function ldraw_lib__191905b(realsolid=false) = [
// 0 Sticker  0.8 x  2 with White "7730"
// 0 Name: 191905b.dat
// 0 Author: Steffen [Steffen]
// 0 !LDRAW_ORG Part UPDATE 2012-01
// 0 !LICENSE Licensed under CC BY 2.0 and CC BY 4.0 : see CAreadme.txt
// 
// 0 BFC CERTIFY CCW
  [0,"BFC","CERTIFY"],
  [0,"BFC","CCW"],
// 
// 0 !HISTORY 2012-03-30 [PTadmin] Official Update 2012-01
// 
// 
// 1 16 0 -0.25 0 20 0 0 0 0.25 0 0 0 -8 box5-12.dat
  [1,16,0,-0.25,0,20,0,0,0,0.25,0,0,0,-8, ldraw_lib__box5_12(realsolid)],
// 1 16 0 -0.25 -4.5 0.415 0 0 0 1 0 0 0 0.415 s\191905s01.dat
  [1,16,0,-0.25,-4.5,0.415,0,0,0,1,0,0,0,0.415, ldraw_lib__s__191905s01(realsolid)],
// 4 16 -20 -0.25 8 -16.6 -0.25 5.46 16.6 -0.25 5.46 20 -0.25 8
  [4,16,-20,-0.25,8,-16.6,-0.25,5.46,16.6,-0.25,5.46,20,-0.25,8],
// 4 16 -16.6 -0.25 5.46 -20 -0.25 8 -20 -0.25 -8 -16.6 -0.25 -7.82
  [4,16,-16.6,-0.25,5.46,-20,-0.25,8,-20,-0.25,-8,-16.6,-0.25,-7.82],
// 4 16 -16.6 -0.25 -7.82 -20 -0.25 -8 20 -0.25 -8 16.6 -0.25 -7.82
  [4,16,-16.6,-0.25,-7.82,-20,-0.25,-8,20,-0.25,-8,16.6,-0.25,-7.82],
// 4 16 20 -0.25 8 16.6 -0.25 5.46 16.6 -0.25 -7.82 20 -0.25 -8
  [4,16,20,-0.25,8,16.6,-0.25,5.46,16.6,-0.25,-7.82,20,-0.25,-8],
// 0
];
module ldraw_lib__191905b(step=0, col=false, unit=2/5, alt=false, line=0.2, solid=!$preview)
    makepoly(ldraw_lib__191905b(solid), step=step, col=col, unit=unit, alt=alt, line=line, solid=solid);
ldraw_lib__191905b(line=0.2);
// main file
use <../lib.scad>
use <191905b.scad>
use <3004.scad>
function ldraw_lib__3004d0k() = [
// 0 Brick  1 x  2 with White "7730" Sticker
// 0 Name: 3004d0k.dat
// 0 Author: Takeshi Takahashi [RainbowDolphin]
// 0 !LDRAW_ORG Shortcut UPDATE 2024-07
// 0 !LICENSE Licensed under CC BY 4.0 : see CAreadme.txt
// 
// 0 BFC CERTIFY CCW
  [0,"BFC","CERTIFY"],
  [0,"BFC","CCW"],
// 
// 0 !CATEGORY Sticker Shortcut
// 0 !KEYWORDS Bricklink 3004pb100, Set 7730, Train
// 
// 0 !HISTORY 2024-08-26 [OrionP] Official Update 2024-07
// 
// 1 16 0 0 0 1 0 0 0 1 0 0 0 1 3004.dat
  [1,16,0,0,0,1,0,0,0,1,0,0,0,1, ldraw_lib__3004()],
// 1 16 0 12 -10 1 0 0 0 0 -1 0 1 0 191905b.dat
  [1,16,0,12,-10,1,0,0,0,0,-1,0,1,0, ldraw_lib__191905b()],
];
module ldraw_lib__3004d0k(step=0, col=false, unit=2/5, alt=false, line=0.2, solid=!$preview)
    makepoly(ldraw_lib__3004d0k(), step=step, col=col, unit=unit, alt=alt, line=line, solid=solid);
ldraw_lib__3004d0k(line=0.2);
